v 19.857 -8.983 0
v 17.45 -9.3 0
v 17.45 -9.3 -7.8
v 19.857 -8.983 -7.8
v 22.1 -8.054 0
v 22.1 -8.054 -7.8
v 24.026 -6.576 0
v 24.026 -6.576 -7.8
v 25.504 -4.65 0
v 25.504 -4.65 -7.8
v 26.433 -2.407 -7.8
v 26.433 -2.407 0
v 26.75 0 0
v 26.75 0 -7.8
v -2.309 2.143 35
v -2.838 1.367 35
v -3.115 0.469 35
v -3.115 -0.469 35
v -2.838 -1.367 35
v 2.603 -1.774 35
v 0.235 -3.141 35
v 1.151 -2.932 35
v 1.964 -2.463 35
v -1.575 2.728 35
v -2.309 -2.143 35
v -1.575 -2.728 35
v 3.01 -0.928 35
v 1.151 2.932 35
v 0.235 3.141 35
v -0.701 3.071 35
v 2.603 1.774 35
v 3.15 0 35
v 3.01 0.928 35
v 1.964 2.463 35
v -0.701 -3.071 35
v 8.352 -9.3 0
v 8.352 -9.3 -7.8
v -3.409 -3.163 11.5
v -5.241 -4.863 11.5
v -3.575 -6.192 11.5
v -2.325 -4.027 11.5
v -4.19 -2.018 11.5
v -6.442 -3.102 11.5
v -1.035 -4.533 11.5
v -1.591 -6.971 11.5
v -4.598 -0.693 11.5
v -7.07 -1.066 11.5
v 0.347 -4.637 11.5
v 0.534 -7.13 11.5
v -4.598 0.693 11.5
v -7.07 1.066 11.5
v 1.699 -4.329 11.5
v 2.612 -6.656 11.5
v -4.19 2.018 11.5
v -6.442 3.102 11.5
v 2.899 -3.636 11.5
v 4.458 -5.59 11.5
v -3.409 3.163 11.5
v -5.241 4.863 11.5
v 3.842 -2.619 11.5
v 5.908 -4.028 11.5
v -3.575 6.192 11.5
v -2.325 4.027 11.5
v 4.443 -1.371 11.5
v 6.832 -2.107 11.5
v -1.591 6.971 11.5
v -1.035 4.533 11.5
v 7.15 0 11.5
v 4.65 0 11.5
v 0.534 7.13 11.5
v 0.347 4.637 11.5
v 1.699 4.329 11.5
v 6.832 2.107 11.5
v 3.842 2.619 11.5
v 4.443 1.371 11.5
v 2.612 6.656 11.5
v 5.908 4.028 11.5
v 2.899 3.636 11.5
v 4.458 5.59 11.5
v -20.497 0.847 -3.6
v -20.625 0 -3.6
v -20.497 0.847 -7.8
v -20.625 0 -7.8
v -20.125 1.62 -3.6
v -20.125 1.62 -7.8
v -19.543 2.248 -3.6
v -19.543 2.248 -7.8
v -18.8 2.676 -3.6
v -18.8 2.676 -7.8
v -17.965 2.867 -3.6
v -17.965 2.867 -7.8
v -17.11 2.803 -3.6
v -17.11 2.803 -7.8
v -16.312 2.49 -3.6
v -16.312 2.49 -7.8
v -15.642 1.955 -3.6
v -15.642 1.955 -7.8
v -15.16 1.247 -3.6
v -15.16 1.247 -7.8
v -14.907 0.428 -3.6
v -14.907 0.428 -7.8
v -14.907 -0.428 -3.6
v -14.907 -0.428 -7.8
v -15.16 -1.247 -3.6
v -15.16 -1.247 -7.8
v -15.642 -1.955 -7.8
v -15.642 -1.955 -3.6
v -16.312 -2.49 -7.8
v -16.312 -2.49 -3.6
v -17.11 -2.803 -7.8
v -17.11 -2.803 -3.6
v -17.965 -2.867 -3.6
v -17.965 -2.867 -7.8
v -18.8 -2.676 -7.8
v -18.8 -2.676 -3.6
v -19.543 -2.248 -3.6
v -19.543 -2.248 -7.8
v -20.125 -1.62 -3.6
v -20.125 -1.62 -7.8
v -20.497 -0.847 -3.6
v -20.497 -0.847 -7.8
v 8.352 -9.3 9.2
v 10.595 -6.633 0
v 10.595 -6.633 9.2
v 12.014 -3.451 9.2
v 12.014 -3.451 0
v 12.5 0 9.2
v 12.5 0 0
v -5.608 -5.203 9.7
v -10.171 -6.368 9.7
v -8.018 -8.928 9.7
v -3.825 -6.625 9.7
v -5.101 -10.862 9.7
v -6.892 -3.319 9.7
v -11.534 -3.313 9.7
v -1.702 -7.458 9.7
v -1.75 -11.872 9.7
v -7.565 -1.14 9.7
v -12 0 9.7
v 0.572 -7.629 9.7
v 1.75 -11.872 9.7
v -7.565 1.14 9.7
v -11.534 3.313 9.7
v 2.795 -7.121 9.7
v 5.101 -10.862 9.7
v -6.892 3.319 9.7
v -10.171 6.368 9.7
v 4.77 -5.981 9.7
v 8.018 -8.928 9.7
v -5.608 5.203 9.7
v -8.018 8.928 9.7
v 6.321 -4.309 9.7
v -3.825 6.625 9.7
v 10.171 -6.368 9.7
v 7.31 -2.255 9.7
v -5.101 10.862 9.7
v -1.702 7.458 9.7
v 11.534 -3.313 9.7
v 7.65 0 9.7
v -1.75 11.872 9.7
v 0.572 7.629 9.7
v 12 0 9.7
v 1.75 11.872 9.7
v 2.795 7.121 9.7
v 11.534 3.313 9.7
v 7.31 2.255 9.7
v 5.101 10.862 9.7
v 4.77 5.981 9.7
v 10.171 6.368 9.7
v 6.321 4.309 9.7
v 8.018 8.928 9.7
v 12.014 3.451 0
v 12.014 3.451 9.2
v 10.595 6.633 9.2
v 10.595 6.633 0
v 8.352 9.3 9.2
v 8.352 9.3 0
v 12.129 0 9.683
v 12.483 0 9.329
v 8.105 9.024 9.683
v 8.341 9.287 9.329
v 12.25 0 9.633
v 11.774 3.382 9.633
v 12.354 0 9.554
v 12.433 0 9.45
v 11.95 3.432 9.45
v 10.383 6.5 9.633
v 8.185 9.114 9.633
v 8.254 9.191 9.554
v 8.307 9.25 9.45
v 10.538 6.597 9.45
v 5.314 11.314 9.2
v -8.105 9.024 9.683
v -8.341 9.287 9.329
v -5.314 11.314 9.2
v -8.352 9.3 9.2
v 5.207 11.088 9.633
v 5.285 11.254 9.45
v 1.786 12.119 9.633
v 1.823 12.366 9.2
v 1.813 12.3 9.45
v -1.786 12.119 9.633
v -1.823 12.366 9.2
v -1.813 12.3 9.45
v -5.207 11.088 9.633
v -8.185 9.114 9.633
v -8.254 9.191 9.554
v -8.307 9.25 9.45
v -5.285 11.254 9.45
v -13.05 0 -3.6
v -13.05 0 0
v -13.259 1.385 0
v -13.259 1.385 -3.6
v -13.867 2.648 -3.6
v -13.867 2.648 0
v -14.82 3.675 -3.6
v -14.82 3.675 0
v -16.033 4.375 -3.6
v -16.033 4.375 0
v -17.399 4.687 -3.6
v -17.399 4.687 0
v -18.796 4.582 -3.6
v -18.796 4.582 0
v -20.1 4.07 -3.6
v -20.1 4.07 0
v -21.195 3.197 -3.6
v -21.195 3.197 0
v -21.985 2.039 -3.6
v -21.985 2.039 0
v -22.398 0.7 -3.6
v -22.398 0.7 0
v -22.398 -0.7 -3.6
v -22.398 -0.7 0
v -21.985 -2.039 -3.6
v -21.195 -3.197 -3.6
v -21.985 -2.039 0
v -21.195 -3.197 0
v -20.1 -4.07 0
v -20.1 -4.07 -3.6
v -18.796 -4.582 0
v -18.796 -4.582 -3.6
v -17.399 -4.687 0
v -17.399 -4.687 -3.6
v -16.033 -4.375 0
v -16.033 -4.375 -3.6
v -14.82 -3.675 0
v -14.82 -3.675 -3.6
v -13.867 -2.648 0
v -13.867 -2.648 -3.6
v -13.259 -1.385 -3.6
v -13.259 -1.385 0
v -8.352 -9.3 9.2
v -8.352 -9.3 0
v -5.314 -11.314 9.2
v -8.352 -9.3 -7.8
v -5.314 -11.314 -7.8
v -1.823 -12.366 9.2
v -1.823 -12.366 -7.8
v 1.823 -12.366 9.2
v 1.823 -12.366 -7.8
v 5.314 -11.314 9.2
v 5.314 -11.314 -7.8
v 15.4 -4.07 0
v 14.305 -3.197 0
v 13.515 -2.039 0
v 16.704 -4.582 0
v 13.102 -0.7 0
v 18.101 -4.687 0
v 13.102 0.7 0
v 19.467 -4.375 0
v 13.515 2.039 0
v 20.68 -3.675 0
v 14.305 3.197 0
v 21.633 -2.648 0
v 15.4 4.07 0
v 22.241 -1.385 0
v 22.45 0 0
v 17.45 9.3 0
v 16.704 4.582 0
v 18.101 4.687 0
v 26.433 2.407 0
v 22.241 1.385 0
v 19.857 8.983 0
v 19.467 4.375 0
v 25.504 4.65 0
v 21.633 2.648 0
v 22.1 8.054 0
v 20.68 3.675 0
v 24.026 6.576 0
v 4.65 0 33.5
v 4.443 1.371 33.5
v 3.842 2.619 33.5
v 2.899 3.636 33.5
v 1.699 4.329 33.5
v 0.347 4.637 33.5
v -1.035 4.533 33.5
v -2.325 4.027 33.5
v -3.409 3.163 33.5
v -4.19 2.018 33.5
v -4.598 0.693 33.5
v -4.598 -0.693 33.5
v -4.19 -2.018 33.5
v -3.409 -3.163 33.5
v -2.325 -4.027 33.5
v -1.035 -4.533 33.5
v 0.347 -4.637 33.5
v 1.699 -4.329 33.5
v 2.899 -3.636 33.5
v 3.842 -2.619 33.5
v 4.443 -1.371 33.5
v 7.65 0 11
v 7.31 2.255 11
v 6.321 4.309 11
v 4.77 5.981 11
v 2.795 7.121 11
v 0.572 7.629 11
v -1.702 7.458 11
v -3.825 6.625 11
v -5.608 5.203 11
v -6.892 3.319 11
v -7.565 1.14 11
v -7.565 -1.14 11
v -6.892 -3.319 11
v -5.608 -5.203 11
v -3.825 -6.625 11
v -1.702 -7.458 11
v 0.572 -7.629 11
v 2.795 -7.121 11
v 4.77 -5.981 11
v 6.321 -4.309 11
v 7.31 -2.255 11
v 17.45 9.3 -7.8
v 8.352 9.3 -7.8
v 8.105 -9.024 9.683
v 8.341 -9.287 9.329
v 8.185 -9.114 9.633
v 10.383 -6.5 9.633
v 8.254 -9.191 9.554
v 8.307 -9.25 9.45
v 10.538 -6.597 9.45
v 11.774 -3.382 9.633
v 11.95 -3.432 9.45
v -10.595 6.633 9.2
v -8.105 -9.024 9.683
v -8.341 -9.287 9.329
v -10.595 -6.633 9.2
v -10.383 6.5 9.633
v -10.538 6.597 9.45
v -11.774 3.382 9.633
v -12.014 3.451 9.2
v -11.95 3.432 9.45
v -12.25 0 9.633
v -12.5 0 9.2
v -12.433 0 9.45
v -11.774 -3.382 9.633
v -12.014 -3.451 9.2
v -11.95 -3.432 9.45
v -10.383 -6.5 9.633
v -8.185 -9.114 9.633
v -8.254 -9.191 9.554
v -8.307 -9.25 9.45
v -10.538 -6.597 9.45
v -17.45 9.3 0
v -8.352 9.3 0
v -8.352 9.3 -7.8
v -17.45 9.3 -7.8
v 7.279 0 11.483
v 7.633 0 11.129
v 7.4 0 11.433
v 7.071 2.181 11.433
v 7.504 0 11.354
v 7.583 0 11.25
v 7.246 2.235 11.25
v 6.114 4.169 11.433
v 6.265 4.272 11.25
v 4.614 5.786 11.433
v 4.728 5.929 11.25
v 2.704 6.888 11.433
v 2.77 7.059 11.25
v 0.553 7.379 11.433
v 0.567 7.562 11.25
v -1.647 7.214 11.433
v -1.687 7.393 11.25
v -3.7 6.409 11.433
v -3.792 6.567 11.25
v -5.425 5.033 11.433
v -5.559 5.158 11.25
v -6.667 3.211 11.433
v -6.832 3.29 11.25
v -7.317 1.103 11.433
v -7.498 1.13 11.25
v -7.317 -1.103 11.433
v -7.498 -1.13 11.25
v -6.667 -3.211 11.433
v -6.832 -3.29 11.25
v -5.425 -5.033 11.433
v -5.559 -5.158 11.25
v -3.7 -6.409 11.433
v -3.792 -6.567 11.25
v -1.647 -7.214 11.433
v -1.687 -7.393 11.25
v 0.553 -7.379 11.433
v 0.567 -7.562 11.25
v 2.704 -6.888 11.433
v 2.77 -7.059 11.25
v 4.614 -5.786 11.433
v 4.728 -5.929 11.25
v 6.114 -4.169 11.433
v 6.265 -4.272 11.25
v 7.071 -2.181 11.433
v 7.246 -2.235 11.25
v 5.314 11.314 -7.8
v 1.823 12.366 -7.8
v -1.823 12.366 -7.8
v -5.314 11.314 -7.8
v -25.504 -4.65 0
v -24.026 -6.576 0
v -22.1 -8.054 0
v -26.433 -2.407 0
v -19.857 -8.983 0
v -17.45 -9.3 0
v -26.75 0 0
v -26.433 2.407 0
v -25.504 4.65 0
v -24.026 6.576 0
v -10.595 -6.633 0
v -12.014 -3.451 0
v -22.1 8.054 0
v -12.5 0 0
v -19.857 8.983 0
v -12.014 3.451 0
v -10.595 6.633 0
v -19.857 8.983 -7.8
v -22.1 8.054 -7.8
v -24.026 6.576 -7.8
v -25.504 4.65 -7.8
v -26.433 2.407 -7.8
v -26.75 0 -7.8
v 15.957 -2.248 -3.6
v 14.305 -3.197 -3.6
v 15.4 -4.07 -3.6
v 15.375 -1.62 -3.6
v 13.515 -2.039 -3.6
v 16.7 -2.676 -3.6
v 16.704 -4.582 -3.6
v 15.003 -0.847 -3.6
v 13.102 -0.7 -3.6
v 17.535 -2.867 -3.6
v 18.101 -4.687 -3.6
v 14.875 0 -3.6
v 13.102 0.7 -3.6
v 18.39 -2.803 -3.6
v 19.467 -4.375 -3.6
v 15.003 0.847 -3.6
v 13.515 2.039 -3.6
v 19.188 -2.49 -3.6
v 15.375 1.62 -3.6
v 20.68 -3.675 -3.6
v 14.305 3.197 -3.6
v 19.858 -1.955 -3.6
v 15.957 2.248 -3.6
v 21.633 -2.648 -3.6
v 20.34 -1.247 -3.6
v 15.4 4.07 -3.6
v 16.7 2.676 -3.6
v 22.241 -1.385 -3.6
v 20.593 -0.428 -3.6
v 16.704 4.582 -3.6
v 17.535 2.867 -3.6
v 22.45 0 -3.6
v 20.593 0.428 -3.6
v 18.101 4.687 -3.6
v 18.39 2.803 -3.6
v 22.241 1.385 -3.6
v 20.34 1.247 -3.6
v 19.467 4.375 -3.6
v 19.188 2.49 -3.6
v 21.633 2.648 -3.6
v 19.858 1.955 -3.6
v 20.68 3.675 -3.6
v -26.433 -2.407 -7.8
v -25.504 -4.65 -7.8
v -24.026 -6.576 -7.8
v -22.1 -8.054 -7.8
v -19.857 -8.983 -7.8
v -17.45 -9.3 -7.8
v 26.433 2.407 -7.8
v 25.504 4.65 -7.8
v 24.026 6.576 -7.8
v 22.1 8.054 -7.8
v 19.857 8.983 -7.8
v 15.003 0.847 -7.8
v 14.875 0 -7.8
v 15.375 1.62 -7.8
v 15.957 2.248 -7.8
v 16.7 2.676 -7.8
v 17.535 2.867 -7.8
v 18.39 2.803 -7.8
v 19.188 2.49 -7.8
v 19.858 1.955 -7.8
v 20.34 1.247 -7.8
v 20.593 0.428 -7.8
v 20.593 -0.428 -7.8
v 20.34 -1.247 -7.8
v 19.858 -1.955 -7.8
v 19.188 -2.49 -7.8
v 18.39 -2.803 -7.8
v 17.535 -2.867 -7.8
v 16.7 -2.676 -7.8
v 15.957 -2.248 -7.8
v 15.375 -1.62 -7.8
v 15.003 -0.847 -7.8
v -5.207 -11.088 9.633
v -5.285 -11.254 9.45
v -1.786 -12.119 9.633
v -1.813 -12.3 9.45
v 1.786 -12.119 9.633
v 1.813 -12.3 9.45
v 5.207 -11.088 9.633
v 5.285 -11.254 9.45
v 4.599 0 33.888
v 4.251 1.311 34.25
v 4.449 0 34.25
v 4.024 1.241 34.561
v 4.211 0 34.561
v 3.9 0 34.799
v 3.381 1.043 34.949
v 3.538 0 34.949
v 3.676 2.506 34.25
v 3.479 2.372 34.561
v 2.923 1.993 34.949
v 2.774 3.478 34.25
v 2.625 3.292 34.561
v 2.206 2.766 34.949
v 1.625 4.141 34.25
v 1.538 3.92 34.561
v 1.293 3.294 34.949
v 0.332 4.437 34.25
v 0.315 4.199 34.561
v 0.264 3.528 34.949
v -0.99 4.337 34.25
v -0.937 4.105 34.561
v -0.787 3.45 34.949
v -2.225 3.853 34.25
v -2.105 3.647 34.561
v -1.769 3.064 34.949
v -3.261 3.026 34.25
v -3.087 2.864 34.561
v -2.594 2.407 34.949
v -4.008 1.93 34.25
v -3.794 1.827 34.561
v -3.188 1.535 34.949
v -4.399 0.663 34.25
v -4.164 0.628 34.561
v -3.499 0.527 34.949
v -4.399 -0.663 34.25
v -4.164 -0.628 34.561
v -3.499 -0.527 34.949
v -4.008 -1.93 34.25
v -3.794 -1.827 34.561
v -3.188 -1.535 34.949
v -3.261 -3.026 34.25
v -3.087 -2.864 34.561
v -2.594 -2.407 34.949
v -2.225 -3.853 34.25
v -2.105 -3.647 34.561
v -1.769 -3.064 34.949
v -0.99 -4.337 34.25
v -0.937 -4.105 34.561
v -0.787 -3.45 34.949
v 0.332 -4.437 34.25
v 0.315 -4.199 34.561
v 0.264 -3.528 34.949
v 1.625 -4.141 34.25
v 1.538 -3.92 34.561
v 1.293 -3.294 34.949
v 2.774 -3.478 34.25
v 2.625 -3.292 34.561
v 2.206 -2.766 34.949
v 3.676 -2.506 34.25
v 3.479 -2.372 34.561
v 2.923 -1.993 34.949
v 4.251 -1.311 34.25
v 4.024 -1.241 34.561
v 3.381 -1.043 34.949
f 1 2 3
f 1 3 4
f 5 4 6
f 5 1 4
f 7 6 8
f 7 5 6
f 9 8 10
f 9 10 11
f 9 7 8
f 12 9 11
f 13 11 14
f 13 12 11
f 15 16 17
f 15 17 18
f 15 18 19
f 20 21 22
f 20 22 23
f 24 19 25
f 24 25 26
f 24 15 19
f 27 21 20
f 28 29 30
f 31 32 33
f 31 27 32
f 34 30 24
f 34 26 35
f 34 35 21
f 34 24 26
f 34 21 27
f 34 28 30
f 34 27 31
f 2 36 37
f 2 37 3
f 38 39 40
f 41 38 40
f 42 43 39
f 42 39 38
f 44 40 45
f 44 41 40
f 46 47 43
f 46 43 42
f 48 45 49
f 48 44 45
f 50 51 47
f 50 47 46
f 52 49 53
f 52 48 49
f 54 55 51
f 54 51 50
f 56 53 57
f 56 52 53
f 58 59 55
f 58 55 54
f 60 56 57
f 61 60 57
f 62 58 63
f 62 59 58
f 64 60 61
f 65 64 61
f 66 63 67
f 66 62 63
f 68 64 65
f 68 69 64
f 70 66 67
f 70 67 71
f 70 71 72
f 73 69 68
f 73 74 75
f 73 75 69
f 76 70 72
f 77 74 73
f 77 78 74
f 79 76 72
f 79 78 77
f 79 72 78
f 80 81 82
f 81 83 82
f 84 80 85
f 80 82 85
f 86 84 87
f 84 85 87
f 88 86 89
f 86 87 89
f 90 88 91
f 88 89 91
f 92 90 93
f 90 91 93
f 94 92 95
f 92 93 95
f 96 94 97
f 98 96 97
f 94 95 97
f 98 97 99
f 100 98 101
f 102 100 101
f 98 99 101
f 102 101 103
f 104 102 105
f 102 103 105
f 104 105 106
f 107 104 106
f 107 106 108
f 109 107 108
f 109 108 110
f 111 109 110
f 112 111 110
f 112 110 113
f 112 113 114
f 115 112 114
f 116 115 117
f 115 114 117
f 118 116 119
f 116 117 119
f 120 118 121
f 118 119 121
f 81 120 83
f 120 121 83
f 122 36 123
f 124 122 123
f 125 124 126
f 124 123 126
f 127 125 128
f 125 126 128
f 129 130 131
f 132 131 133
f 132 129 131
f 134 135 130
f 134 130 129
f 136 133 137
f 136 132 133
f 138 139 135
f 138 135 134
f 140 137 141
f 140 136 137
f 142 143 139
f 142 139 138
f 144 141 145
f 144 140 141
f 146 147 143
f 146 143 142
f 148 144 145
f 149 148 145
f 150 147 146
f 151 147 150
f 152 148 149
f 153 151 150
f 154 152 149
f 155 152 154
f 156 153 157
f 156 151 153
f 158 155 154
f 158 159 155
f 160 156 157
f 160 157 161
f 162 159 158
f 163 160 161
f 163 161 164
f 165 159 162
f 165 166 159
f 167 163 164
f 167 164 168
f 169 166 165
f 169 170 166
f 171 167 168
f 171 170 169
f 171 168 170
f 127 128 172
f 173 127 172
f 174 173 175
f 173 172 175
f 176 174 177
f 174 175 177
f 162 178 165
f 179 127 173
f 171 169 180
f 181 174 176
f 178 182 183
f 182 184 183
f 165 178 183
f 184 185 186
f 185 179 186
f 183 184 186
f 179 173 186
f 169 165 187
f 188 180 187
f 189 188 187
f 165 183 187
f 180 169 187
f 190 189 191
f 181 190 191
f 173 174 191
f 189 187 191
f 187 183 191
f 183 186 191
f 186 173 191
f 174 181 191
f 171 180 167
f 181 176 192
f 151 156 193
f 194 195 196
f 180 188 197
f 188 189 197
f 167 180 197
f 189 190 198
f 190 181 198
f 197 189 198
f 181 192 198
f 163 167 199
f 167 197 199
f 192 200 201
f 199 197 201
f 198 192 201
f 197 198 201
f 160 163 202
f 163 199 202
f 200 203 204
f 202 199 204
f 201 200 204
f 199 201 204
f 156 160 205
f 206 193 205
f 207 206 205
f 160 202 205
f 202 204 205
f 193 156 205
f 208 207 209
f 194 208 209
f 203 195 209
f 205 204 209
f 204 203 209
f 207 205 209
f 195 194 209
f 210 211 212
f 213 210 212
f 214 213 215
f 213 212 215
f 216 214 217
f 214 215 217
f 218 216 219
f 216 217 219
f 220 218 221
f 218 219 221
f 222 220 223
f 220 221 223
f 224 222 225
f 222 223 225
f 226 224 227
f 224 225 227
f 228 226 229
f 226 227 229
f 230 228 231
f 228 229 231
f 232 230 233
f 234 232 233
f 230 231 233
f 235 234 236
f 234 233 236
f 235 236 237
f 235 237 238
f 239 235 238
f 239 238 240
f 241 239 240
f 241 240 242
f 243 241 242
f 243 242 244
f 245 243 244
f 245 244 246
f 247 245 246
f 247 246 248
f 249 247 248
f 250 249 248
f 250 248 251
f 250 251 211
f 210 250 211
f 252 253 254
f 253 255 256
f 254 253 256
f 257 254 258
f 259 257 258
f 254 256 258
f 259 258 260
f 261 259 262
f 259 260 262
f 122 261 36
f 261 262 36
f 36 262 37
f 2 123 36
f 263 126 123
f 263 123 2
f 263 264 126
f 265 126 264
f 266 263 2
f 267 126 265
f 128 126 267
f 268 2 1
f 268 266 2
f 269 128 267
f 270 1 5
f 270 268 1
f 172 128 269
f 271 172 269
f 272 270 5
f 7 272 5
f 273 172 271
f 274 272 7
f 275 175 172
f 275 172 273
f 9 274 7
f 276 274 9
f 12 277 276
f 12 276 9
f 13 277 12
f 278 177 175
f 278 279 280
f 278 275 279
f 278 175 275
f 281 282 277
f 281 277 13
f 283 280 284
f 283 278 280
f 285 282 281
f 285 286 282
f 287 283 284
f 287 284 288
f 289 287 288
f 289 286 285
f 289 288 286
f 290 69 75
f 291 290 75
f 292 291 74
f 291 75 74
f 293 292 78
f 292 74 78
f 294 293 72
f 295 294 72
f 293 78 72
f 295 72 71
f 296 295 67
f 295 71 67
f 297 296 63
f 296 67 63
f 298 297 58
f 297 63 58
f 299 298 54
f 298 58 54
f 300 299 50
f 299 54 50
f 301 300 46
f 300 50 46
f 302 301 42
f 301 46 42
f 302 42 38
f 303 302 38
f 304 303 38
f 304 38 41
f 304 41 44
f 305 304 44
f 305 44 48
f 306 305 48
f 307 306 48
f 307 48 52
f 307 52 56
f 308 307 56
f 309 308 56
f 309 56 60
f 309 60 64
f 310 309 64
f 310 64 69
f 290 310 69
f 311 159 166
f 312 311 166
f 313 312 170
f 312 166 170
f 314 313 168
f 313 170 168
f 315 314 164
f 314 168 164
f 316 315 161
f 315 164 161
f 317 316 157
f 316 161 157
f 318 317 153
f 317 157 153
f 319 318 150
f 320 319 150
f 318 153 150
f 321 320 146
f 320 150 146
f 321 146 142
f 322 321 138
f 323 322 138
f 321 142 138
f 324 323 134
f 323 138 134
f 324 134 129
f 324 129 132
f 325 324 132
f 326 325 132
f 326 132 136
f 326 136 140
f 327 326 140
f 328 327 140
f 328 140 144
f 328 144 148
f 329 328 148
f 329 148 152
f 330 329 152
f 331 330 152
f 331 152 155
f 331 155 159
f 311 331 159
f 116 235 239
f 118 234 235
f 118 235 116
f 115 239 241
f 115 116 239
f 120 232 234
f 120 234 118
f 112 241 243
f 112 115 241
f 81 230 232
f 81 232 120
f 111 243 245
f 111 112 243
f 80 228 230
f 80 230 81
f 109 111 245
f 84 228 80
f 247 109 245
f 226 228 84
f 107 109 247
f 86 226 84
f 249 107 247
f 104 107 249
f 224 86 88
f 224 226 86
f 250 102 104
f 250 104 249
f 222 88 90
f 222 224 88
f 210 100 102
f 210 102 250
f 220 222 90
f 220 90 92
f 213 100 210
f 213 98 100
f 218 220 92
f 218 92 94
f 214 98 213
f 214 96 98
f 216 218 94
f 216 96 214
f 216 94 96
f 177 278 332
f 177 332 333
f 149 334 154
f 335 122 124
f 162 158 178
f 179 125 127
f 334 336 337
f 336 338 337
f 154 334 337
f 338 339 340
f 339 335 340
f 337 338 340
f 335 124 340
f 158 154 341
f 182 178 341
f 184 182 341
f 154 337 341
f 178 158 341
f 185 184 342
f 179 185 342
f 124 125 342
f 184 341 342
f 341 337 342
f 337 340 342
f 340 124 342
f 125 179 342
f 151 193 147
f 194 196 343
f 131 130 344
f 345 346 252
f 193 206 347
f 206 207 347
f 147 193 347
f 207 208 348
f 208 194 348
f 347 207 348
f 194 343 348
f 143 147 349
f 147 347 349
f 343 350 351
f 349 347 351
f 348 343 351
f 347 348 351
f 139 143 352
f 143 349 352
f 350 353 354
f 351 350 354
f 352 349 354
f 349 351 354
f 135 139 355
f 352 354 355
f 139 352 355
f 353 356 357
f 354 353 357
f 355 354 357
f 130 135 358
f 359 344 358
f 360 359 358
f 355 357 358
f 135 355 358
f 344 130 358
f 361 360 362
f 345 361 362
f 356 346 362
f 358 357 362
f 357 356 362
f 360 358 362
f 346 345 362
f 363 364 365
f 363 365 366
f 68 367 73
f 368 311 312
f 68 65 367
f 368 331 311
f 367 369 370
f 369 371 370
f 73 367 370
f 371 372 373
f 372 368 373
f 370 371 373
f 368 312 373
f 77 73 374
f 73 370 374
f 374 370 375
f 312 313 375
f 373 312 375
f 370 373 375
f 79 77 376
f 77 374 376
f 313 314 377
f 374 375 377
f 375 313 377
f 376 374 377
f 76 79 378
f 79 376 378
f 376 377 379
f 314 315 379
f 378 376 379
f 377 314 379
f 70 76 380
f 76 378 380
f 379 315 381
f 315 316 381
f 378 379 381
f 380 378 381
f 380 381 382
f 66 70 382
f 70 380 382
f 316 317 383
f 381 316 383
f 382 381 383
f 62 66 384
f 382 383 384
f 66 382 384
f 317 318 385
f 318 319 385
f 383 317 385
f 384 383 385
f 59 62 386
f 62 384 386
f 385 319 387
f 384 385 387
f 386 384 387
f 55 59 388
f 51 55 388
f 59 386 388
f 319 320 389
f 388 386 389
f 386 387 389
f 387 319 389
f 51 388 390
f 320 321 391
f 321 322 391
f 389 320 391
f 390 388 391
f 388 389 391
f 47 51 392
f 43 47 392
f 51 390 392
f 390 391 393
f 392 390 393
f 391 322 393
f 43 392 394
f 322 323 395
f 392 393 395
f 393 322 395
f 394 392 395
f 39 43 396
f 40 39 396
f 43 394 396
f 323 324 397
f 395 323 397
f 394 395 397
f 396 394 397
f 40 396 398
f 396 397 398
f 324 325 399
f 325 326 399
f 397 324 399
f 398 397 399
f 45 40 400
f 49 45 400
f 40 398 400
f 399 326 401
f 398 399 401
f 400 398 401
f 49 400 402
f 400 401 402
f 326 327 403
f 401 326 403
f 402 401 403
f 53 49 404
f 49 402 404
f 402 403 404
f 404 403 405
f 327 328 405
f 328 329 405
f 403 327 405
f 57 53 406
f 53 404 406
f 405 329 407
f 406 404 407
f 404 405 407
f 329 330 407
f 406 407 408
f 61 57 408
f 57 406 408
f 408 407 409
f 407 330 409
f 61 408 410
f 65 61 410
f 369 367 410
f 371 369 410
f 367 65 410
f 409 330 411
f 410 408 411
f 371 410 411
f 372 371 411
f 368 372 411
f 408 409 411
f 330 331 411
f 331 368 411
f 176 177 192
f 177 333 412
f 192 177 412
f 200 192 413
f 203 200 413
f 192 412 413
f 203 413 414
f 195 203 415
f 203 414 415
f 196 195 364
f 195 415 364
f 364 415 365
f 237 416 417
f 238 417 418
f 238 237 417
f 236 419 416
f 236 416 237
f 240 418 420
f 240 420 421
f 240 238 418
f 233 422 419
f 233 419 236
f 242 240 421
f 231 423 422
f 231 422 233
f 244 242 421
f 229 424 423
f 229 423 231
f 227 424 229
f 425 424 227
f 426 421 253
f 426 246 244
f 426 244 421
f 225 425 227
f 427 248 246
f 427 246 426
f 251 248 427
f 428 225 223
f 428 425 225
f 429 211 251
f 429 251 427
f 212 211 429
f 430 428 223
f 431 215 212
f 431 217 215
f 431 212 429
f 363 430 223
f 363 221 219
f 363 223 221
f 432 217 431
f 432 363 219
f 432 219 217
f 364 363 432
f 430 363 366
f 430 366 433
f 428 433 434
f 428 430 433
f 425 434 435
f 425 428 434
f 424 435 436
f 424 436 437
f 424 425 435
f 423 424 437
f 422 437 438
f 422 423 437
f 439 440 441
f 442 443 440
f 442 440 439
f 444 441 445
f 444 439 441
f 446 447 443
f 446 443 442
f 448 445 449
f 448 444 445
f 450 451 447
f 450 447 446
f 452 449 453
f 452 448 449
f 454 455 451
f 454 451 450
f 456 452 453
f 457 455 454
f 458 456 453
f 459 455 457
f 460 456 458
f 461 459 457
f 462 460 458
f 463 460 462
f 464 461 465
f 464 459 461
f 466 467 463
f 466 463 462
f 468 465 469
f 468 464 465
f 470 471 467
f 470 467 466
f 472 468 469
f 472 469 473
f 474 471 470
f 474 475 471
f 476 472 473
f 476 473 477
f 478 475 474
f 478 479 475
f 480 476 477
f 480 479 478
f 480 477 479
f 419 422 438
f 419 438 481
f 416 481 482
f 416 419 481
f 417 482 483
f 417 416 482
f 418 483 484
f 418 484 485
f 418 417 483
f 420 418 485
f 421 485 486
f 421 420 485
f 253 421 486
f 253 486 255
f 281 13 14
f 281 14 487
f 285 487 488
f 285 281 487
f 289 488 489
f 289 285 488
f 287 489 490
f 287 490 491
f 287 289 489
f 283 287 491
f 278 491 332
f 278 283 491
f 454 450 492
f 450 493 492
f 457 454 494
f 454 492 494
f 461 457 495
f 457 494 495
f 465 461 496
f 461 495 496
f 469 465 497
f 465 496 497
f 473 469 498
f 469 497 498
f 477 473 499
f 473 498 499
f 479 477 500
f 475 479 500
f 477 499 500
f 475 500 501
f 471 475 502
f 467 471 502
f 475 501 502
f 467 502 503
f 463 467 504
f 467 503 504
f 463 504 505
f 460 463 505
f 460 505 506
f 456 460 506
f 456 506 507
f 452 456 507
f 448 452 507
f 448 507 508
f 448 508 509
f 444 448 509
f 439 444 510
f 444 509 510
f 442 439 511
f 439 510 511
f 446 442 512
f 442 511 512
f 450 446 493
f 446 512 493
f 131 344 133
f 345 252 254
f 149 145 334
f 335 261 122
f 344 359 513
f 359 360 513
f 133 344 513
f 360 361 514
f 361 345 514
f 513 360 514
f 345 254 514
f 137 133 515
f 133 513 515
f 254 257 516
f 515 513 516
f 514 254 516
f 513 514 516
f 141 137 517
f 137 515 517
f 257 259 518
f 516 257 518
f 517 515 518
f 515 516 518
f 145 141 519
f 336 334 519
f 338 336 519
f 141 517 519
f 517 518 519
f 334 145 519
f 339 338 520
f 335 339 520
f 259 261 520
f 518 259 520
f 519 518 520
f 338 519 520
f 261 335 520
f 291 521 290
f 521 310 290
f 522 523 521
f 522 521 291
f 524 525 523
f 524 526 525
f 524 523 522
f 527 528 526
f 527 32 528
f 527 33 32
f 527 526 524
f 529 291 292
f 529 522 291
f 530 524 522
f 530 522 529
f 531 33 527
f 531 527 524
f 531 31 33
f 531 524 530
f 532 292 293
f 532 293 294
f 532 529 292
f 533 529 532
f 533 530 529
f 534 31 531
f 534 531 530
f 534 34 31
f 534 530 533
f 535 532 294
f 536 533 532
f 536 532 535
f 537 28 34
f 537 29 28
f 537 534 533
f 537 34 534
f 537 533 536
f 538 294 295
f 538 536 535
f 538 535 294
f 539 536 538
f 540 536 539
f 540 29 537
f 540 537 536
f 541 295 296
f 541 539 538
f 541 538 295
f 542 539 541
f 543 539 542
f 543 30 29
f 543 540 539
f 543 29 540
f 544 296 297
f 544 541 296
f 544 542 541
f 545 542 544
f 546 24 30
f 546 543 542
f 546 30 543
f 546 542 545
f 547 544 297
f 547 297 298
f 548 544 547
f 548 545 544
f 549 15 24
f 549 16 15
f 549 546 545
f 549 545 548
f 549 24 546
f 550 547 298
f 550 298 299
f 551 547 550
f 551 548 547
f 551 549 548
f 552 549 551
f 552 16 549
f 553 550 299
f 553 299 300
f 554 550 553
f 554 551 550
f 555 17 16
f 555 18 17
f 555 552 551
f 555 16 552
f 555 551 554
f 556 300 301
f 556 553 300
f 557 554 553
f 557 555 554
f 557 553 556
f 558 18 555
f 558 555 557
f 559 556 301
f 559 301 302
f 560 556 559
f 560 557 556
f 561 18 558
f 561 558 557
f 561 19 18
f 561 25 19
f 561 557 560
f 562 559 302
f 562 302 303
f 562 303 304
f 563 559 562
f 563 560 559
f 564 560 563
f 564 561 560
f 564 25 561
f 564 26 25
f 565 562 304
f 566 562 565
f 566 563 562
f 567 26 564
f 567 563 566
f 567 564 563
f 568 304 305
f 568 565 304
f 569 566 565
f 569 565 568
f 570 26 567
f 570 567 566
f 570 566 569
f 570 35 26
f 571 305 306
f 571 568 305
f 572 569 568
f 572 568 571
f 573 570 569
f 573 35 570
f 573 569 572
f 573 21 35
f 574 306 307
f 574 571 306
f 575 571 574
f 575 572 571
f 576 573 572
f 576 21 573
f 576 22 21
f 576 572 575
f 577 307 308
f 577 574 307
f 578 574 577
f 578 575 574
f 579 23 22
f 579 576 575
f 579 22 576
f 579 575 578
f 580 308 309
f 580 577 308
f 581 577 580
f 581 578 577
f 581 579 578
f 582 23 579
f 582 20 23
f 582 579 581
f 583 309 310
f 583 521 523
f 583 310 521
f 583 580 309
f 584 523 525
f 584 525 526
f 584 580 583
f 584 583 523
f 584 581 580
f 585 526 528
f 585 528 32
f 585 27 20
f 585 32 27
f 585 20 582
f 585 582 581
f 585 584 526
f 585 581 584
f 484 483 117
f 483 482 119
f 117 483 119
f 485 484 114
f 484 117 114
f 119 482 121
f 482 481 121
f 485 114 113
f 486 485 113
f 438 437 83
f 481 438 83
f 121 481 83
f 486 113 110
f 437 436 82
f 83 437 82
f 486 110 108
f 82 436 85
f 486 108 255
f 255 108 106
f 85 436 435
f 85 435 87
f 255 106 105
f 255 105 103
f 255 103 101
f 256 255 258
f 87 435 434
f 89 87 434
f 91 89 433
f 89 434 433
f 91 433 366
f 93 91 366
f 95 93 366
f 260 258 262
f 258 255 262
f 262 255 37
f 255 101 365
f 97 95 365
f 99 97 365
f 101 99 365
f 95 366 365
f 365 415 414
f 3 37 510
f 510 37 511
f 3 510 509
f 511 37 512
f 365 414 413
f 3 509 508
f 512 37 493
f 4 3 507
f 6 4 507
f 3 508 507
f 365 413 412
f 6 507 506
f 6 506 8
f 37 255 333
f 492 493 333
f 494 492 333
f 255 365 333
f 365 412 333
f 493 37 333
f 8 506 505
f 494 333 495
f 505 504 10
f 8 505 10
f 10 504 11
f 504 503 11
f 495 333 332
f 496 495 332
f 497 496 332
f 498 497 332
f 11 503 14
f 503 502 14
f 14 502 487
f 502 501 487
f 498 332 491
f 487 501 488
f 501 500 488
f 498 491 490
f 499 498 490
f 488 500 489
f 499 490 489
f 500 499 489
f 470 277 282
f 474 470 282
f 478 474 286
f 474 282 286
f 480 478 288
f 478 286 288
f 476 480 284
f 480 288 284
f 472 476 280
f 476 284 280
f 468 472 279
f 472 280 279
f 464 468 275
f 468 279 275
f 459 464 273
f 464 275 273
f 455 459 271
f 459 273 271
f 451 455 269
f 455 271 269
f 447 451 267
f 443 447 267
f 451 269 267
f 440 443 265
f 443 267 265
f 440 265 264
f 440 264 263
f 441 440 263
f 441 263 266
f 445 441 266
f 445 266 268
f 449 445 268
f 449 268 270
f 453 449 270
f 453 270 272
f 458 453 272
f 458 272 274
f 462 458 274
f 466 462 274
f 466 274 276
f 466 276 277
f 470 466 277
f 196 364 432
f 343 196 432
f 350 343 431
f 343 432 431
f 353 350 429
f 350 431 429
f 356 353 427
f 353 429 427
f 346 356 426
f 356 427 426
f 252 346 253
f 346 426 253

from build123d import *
from build123d import SkipClean  # not in build123d's __all__

# Parameters (mm, degrees)
F0_R           = 7.65
F0_R_2         = 4.65
F1_DEPTH       = 7.8
F2_DEPTH       = 9.7
F3_DEPTH       = 11.5
F4_DEPTH       = 35
F5_D           = 5.75
F5_CBORE_D     = 9.4
F5_CBORE_DEPTH = 3.6
F6_R           = 0.5
F7_R           = 1.5


# Not quite as in the source:
# - after a boolean that leaves OpenCascade's solid faulty, fix() repairs it


with BuildPart() as f1:
    # F0 (on Top) → F1 (new body)
    with BuildSketch(Plane.XY):
        with BuildLine():
            ThreePointArc((-8.3522452071, -9.3), (-12.5, 0), (-8.3522452071, 9.3))
            Line((-8.3522452071, 9.3), (-17.45, 9.3))
            ThreePointArc((-17.45, 9.3), (-24.026093065, 6.576093065), (-26.75, 0))
            ThreePointArc((-26.75, 0), (-24.026093065, -6.576093065), (-17.45, -9.3))
            Line((-17.45, -9.3), (-8.3522452071, -9.3))
        make_face()
        with BuildLine():
            ThreePointArc((12.5, 0), (11.4160646698, 5.0915093494), (8.3522452071, 9.3))
            Line((8.3522452071, 9.3), (-8.3522452071, 9.3))
            ThreePointArc((-8.3522452071, 9.3), (-12.5, 0), (-8.3522452071, -9.3))
            Line((-8.3522452071, -9.3), (8.3522452071, -9.3))
            ThreePointArc((8.3522452071, -9.3), (11.4160646698, -5.0915093494), (12.5, 0))
        make_face()
        Circle(F0_R, mode=Mode.SUBTRACT)
        Circle(F0_R)
        Circle(F0_R_2, mode=Mode.SUBTRACT)
        Circle(F0_R_2)
        with BuildLine():
            ThreePointArc((26.75, 0), (24.026093065, 6.576093065), (17.45, 9.3))
            Line((17.45, 9.3), (8.3522452071, 9.3))
            ThreePointArc((8.3522452071, 9.3), (11.4160646698, 5.0915093494), (12.5, 0))
            ThreePointArc((12.5, 0), (11.4160646698, -5.0915093494), (8.3522452071, -9.3))
            Line((8.3522452071, -9.3), (17.45, -9.3))
            ThreePointArc((17.45, -9.3), (24.026093065, -6.576093065), (26.75, 0))
        make_face()
        with BuildLine():
            Line((-8.3522452071, 9.3), (8.3522452071, 9.3))
            ThreePointArc((8.3522452071, 9.3), (0, 12.5), (-8.3522452071, 9.3))
        make_face()
        with BuildLine():
            ThreePointArc((-8.3522452071, -9.3), (0, -12.5), (8.3522452071, -9.3))
            Line((8.3522452071, -9.3), (-8.3522452071, -9.3))
        make_face()
    extrude(amount=-F1_DEPTH)

    # F0 (on Top) → F2 (join)
    with BuildSketch(Plane.XY):
        with BuildLine():
            Line((-8.3522452071, 9.3), (8.3522452071, 9.3))
            ThreePointArc((8.3522452071, 9.3), (0, 12.5), (-8.3522452071, 9.3))
        make_face()
        with BuildLine():
            ThreePointArc((-8.3522452071, -9.3), (0, -12.5), (8.3522452071, -9.3))
            Line((8.3522452071, -9.3), (-8.3522452071, -9.3))
        make_face()
        with BuildLine():
            ThreePointArc((12.5, 0), (11.4160646698, 5.0915093494), (8.3522452071, 9.3))
            Line((8.3522452071, 9.3), (-8.3522452071, 9.3))
            ThreePointArc((-8.3522452071, 9.3), (-12.5, 0), (-8.3522452071, -9.3))
            Line((-8.3522452071, -9.3), (8.3522452071, -9.3))
            ThreePointArc((8.3522452071, -9.3), (11.4160646698, -5.0915093494), (12.5, 0))
        make_face()
        Circle(F0_R, mode=Mode.SUBTRACT)
        Circle(F0_R)
        Circle(F0_R_2, mode=Mode.SUBTRACT)
        Circle(F0_R_2)
    with SkipClean():  # cleaning this boolean's faces spoils the solid; the shape is the same uncleaned
        extrude(amount=F2_DEPTH)

    # F0 (on Top) → F3 (join)
    with BuildSketch(Plane.XY):
        Circle(F0_R)
        Circle(F0_R_2, mode=Mode.SUBTRACT)
        Circle(F0_R_2)
    extrude(amount=F3_DEPTH)

    add(f1.part.fix(), mode=Mode.REPLACE)

    # F0 (on Top) → F4 (join)
    with BuildSketch(Plane.XY):
        Circle(F0_R_2)
    extrude(amount=F4_DEPTH)

    # F5 (through all)
    with Locations(Plane.XY):
        with Locations((-17.75, 0), (17.75, 0)):
            CounterBoreHole(F5_D / 2, F5_CBORE_D / 2, F5_CBORE_DEPTH)

    # F6
    f6_edges = [f1.edges().sort_by_distance(p)[0] for p in [
        (8.352245, -9.3, 9.7),
        (-7.65, 0, 11.5),
    ]]
    fillet(f6_edges, radius=F6_R)

    # F7
    f7_edges = [f1.edges().sort_by_distance(p)[0] for p in [
        (-4.65, 0, 35),
    ]]
    fillet(f7_edges, radius=F7_R)


solid = f1.part
